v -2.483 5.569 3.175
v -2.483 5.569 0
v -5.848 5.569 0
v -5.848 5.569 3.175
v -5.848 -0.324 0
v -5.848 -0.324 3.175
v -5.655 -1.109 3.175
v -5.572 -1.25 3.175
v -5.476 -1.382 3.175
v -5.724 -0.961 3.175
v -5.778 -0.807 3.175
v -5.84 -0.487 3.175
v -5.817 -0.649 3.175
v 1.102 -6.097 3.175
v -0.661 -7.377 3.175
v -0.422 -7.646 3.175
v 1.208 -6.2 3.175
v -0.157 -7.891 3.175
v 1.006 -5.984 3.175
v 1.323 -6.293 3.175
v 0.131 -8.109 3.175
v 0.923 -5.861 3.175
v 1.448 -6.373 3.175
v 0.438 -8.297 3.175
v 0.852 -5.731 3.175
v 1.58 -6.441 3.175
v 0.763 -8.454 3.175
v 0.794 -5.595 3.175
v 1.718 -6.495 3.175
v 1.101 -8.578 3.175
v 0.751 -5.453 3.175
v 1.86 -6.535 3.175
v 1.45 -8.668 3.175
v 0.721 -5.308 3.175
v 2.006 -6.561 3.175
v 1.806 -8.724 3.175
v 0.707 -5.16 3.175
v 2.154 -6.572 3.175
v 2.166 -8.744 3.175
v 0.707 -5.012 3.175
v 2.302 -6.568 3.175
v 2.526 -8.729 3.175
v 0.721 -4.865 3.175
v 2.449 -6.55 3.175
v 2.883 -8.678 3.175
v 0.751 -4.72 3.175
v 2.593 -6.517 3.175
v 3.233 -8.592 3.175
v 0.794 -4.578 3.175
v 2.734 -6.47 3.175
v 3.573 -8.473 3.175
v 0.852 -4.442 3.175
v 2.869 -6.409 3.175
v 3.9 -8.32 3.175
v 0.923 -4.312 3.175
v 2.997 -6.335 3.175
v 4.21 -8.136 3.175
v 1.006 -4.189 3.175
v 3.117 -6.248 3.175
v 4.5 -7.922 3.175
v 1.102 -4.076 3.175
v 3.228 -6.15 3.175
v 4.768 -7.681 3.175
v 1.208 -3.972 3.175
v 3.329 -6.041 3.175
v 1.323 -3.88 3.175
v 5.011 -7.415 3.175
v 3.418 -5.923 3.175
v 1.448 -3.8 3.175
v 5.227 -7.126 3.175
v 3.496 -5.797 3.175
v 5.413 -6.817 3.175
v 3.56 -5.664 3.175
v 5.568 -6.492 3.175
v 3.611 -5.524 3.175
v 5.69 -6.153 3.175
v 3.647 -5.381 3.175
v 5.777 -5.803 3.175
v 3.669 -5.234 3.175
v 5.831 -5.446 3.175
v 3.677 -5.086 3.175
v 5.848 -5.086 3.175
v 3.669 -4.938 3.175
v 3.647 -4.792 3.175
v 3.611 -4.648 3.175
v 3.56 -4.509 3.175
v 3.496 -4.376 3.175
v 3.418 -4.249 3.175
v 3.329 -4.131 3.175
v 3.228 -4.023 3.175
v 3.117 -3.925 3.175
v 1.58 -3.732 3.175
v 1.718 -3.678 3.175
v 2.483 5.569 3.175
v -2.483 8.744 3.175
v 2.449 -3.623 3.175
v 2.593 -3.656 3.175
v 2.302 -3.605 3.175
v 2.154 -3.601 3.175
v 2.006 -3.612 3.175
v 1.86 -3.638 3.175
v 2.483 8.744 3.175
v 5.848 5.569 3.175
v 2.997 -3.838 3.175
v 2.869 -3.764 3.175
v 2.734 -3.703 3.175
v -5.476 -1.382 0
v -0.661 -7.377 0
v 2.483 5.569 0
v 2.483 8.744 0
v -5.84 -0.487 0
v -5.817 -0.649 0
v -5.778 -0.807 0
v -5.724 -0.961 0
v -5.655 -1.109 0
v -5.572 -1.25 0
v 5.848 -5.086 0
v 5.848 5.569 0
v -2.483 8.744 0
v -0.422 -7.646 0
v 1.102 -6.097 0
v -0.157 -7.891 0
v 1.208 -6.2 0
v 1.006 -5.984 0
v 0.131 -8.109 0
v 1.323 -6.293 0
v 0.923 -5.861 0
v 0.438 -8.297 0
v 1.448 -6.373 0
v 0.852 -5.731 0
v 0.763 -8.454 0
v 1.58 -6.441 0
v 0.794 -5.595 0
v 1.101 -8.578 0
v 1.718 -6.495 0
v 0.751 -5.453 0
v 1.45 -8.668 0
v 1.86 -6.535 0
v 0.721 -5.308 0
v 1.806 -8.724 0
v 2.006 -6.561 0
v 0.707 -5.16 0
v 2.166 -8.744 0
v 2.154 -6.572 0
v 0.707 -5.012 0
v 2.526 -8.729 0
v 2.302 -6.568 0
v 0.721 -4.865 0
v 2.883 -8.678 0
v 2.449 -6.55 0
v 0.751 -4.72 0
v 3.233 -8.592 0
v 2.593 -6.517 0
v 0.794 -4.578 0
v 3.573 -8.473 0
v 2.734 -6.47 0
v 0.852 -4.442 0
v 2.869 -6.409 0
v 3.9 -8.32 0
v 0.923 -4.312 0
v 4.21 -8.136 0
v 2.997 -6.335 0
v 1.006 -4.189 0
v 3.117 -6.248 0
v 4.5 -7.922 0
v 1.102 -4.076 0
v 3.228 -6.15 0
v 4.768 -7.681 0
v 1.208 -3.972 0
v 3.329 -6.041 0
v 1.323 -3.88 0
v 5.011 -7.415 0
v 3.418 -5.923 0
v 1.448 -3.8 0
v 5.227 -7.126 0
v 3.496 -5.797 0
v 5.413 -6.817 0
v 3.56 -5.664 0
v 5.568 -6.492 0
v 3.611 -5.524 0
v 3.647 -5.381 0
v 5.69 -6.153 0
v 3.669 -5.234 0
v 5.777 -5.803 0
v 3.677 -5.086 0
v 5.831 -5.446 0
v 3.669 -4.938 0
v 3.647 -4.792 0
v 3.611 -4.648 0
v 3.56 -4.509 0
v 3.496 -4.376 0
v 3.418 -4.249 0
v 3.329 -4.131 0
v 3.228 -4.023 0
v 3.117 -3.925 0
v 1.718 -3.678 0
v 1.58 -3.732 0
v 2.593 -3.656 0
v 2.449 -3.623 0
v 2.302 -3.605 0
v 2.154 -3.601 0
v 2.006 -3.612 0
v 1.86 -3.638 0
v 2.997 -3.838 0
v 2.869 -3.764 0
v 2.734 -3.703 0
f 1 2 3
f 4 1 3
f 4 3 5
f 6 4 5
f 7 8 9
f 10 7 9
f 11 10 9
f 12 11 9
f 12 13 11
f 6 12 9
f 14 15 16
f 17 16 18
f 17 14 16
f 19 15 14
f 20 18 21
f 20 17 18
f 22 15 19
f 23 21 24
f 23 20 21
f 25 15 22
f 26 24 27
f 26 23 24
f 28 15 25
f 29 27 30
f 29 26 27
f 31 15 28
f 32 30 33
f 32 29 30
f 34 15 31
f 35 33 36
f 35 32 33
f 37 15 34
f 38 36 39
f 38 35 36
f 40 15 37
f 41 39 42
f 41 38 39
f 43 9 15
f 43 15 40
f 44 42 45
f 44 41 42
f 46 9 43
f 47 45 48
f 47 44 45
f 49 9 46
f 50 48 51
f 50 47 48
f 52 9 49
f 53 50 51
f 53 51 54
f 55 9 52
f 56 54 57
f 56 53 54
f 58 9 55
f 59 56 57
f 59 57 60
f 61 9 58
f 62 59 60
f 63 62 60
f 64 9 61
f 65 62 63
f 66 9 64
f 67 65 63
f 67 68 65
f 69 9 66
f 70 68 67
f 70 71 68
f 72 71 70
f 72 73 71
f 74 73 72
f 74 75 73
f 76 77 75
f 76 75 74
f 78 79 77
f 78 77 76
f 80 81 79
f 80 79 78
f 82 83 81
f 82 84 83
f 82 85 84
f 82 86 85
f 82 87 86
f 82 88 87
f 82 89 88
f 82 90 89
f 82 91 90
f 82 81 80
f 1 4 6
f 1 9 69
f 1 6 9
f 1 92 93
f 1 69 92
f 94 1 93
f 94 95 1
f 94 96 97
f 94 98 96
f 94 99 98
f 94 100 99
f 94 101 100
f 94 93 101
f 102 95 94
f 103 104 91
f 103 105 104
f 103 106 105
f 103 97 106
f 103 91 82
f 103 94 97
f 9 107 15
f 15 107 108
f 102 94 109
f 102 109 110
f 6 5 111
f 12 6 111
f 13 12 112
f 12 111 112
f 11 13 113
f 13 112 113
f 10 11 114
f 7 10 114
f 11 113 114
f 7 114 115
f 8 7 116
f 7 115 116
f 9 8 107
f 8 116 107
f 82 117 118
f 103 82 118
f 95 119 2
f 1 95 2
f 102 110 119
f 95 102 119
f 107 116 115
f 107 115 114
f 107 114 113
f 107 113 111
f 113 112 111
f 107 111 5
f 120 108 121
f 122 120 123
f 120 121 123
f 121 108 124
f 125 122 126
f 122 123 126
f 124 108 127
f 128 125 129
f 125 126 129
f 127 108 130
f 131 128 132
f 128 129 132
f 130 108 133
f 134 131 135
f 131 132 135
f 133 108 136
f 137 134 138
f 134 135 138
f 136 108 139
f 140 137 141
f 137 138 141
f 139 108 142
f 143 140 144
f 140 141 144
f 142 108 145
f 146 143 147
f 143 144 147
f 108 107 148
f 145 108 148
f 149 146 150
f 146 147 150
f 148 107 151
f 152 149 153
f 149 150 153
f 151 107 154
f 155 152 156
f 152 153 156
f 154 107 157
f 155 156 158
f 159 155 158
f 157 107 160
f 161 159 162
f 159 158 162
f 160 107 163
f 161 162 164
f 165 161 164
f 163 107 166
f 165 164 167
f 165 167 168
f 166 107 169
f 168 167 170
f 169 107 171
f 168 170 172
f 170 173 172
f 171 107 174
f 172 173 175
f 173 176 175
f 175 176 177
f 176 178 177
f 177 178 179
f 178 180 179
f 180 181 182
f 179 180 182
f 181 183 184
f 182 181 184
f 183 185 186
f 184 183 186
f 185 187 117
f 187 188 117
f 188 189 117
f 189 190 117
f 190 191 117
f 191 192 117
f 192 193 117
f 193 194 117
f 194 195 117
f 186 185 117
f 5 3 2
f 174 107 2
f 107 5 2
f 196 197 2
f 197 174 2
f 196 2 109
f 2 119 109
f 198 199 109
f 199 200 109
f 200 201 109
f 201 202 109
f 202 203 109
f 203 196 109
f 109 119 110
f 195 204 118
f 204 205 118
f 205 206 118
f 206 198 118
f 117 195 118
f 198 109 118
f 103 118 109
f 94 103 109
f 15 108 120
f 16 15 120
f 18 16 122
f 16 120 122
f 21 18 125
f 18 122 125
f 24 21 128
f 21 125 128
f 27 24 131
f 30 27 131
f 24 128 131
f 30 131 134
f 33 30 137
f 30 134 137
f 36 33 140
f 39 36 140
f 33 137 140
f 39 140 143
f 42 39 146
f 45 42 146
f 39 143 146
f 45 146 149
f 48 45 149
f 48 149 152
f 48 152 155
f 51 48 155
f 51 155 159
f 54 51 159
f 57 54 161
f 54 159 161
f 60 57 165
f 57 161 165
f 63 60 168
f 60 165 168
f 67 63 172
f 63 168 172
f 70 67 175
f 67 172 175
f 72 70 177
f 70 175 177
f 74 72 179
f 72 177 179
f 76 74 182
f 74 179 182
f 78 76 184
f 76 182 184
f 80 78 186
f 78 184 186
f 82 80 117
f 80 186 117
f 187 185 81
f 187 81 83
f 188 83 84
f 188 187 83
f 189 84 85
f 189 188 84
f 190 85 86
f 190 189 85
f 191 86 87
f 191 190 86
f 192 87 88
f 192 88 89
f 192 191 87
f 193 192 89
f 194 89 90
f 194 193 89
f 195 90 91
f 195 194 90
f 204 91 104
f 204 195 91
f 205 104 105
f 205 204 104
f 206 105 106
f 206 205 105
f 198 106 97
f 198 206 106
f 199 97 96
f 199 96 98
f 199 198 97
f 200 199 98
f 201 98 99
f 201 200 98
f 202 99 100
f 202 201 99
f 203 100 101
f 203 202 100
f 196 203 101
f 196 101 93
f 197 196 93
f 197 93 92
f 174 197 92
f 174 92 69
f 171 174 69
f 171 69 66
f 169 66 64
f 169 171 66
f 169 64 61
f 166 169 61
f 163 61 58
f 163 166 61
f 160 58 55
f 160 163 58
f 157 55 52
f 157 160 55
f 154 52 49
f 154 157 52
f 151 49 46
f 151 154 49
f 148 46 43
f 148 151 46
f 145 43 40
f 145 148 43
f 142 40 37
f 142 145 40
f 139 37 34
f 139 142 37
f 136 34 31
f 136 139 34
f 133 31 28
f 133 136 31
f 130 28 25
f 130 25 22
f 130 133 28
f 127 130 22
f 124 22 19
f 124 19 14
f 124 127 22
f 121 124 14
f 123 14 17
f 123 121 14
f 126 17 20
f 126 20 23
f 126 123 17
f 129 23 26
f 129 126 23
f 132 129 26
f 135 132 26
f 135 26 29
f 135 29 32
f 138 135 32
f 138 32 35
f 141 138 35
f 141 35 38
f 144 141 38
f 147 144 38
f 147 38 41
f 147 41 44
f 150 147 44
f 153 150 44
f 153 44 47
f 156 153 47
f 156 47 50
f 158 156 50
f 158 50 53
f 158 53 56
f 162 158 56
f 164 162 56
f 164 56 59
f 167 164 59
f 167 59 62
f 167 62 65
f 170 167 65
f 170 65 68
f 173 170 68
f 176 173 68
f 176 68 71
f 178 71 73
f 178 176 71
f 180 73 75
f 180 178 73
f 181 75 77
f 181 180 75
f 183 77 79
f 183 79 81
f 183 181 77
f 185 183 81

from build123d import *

# Parameters (mm, degrees)
SKETCH1_R           = 1.4859
BOSS_EXTRUDE1_DEPTH = 3.175


with BuildPart() as part:
    # Sketch1 → Boss-Extrude1 (new body)
    with BuildSketch(Plane.XY):
        with BuildLine():
            Line((-5.476150442, -1.381790583), (-0.66088404, -7.376813067))
            ThreePointArc((-0.66088404, -7.376813067), (3.40481365, -8.536580023), (5.84835, -5.08635))
            Line((5.84835, -5.08635), (5.84835, 5.56895))
            Line((5.84835, 5.56895), (2.48285, 5.56895))
            Line((2.48285, 5.56895), (2.48285, 8.74395))
            Line((2.48285, 8.74395), (-2.48285, 8.74395))
            Line((-2.48285, 8.74395), (-2.48285, 5.56895))
            Line((-2.48285, 5.56895), (-5.84835, 5.56895))
            Line((-5.84835, 5.56895), (-5.84835, -0.324042014))
            ThreePointArc((-5.84835, -0.324042014), (-5.752585393, -0.884703352), (-5.476150442, -1.381790583))
        make_face()
        with Locations((2.19075, -5.08635)):
            Circle(SKETCH1_R, mode=Mode.SUBTRACT)
    extrude(amount=BOSS_EXTRUDE1_DEPTH)


solid = part.part
